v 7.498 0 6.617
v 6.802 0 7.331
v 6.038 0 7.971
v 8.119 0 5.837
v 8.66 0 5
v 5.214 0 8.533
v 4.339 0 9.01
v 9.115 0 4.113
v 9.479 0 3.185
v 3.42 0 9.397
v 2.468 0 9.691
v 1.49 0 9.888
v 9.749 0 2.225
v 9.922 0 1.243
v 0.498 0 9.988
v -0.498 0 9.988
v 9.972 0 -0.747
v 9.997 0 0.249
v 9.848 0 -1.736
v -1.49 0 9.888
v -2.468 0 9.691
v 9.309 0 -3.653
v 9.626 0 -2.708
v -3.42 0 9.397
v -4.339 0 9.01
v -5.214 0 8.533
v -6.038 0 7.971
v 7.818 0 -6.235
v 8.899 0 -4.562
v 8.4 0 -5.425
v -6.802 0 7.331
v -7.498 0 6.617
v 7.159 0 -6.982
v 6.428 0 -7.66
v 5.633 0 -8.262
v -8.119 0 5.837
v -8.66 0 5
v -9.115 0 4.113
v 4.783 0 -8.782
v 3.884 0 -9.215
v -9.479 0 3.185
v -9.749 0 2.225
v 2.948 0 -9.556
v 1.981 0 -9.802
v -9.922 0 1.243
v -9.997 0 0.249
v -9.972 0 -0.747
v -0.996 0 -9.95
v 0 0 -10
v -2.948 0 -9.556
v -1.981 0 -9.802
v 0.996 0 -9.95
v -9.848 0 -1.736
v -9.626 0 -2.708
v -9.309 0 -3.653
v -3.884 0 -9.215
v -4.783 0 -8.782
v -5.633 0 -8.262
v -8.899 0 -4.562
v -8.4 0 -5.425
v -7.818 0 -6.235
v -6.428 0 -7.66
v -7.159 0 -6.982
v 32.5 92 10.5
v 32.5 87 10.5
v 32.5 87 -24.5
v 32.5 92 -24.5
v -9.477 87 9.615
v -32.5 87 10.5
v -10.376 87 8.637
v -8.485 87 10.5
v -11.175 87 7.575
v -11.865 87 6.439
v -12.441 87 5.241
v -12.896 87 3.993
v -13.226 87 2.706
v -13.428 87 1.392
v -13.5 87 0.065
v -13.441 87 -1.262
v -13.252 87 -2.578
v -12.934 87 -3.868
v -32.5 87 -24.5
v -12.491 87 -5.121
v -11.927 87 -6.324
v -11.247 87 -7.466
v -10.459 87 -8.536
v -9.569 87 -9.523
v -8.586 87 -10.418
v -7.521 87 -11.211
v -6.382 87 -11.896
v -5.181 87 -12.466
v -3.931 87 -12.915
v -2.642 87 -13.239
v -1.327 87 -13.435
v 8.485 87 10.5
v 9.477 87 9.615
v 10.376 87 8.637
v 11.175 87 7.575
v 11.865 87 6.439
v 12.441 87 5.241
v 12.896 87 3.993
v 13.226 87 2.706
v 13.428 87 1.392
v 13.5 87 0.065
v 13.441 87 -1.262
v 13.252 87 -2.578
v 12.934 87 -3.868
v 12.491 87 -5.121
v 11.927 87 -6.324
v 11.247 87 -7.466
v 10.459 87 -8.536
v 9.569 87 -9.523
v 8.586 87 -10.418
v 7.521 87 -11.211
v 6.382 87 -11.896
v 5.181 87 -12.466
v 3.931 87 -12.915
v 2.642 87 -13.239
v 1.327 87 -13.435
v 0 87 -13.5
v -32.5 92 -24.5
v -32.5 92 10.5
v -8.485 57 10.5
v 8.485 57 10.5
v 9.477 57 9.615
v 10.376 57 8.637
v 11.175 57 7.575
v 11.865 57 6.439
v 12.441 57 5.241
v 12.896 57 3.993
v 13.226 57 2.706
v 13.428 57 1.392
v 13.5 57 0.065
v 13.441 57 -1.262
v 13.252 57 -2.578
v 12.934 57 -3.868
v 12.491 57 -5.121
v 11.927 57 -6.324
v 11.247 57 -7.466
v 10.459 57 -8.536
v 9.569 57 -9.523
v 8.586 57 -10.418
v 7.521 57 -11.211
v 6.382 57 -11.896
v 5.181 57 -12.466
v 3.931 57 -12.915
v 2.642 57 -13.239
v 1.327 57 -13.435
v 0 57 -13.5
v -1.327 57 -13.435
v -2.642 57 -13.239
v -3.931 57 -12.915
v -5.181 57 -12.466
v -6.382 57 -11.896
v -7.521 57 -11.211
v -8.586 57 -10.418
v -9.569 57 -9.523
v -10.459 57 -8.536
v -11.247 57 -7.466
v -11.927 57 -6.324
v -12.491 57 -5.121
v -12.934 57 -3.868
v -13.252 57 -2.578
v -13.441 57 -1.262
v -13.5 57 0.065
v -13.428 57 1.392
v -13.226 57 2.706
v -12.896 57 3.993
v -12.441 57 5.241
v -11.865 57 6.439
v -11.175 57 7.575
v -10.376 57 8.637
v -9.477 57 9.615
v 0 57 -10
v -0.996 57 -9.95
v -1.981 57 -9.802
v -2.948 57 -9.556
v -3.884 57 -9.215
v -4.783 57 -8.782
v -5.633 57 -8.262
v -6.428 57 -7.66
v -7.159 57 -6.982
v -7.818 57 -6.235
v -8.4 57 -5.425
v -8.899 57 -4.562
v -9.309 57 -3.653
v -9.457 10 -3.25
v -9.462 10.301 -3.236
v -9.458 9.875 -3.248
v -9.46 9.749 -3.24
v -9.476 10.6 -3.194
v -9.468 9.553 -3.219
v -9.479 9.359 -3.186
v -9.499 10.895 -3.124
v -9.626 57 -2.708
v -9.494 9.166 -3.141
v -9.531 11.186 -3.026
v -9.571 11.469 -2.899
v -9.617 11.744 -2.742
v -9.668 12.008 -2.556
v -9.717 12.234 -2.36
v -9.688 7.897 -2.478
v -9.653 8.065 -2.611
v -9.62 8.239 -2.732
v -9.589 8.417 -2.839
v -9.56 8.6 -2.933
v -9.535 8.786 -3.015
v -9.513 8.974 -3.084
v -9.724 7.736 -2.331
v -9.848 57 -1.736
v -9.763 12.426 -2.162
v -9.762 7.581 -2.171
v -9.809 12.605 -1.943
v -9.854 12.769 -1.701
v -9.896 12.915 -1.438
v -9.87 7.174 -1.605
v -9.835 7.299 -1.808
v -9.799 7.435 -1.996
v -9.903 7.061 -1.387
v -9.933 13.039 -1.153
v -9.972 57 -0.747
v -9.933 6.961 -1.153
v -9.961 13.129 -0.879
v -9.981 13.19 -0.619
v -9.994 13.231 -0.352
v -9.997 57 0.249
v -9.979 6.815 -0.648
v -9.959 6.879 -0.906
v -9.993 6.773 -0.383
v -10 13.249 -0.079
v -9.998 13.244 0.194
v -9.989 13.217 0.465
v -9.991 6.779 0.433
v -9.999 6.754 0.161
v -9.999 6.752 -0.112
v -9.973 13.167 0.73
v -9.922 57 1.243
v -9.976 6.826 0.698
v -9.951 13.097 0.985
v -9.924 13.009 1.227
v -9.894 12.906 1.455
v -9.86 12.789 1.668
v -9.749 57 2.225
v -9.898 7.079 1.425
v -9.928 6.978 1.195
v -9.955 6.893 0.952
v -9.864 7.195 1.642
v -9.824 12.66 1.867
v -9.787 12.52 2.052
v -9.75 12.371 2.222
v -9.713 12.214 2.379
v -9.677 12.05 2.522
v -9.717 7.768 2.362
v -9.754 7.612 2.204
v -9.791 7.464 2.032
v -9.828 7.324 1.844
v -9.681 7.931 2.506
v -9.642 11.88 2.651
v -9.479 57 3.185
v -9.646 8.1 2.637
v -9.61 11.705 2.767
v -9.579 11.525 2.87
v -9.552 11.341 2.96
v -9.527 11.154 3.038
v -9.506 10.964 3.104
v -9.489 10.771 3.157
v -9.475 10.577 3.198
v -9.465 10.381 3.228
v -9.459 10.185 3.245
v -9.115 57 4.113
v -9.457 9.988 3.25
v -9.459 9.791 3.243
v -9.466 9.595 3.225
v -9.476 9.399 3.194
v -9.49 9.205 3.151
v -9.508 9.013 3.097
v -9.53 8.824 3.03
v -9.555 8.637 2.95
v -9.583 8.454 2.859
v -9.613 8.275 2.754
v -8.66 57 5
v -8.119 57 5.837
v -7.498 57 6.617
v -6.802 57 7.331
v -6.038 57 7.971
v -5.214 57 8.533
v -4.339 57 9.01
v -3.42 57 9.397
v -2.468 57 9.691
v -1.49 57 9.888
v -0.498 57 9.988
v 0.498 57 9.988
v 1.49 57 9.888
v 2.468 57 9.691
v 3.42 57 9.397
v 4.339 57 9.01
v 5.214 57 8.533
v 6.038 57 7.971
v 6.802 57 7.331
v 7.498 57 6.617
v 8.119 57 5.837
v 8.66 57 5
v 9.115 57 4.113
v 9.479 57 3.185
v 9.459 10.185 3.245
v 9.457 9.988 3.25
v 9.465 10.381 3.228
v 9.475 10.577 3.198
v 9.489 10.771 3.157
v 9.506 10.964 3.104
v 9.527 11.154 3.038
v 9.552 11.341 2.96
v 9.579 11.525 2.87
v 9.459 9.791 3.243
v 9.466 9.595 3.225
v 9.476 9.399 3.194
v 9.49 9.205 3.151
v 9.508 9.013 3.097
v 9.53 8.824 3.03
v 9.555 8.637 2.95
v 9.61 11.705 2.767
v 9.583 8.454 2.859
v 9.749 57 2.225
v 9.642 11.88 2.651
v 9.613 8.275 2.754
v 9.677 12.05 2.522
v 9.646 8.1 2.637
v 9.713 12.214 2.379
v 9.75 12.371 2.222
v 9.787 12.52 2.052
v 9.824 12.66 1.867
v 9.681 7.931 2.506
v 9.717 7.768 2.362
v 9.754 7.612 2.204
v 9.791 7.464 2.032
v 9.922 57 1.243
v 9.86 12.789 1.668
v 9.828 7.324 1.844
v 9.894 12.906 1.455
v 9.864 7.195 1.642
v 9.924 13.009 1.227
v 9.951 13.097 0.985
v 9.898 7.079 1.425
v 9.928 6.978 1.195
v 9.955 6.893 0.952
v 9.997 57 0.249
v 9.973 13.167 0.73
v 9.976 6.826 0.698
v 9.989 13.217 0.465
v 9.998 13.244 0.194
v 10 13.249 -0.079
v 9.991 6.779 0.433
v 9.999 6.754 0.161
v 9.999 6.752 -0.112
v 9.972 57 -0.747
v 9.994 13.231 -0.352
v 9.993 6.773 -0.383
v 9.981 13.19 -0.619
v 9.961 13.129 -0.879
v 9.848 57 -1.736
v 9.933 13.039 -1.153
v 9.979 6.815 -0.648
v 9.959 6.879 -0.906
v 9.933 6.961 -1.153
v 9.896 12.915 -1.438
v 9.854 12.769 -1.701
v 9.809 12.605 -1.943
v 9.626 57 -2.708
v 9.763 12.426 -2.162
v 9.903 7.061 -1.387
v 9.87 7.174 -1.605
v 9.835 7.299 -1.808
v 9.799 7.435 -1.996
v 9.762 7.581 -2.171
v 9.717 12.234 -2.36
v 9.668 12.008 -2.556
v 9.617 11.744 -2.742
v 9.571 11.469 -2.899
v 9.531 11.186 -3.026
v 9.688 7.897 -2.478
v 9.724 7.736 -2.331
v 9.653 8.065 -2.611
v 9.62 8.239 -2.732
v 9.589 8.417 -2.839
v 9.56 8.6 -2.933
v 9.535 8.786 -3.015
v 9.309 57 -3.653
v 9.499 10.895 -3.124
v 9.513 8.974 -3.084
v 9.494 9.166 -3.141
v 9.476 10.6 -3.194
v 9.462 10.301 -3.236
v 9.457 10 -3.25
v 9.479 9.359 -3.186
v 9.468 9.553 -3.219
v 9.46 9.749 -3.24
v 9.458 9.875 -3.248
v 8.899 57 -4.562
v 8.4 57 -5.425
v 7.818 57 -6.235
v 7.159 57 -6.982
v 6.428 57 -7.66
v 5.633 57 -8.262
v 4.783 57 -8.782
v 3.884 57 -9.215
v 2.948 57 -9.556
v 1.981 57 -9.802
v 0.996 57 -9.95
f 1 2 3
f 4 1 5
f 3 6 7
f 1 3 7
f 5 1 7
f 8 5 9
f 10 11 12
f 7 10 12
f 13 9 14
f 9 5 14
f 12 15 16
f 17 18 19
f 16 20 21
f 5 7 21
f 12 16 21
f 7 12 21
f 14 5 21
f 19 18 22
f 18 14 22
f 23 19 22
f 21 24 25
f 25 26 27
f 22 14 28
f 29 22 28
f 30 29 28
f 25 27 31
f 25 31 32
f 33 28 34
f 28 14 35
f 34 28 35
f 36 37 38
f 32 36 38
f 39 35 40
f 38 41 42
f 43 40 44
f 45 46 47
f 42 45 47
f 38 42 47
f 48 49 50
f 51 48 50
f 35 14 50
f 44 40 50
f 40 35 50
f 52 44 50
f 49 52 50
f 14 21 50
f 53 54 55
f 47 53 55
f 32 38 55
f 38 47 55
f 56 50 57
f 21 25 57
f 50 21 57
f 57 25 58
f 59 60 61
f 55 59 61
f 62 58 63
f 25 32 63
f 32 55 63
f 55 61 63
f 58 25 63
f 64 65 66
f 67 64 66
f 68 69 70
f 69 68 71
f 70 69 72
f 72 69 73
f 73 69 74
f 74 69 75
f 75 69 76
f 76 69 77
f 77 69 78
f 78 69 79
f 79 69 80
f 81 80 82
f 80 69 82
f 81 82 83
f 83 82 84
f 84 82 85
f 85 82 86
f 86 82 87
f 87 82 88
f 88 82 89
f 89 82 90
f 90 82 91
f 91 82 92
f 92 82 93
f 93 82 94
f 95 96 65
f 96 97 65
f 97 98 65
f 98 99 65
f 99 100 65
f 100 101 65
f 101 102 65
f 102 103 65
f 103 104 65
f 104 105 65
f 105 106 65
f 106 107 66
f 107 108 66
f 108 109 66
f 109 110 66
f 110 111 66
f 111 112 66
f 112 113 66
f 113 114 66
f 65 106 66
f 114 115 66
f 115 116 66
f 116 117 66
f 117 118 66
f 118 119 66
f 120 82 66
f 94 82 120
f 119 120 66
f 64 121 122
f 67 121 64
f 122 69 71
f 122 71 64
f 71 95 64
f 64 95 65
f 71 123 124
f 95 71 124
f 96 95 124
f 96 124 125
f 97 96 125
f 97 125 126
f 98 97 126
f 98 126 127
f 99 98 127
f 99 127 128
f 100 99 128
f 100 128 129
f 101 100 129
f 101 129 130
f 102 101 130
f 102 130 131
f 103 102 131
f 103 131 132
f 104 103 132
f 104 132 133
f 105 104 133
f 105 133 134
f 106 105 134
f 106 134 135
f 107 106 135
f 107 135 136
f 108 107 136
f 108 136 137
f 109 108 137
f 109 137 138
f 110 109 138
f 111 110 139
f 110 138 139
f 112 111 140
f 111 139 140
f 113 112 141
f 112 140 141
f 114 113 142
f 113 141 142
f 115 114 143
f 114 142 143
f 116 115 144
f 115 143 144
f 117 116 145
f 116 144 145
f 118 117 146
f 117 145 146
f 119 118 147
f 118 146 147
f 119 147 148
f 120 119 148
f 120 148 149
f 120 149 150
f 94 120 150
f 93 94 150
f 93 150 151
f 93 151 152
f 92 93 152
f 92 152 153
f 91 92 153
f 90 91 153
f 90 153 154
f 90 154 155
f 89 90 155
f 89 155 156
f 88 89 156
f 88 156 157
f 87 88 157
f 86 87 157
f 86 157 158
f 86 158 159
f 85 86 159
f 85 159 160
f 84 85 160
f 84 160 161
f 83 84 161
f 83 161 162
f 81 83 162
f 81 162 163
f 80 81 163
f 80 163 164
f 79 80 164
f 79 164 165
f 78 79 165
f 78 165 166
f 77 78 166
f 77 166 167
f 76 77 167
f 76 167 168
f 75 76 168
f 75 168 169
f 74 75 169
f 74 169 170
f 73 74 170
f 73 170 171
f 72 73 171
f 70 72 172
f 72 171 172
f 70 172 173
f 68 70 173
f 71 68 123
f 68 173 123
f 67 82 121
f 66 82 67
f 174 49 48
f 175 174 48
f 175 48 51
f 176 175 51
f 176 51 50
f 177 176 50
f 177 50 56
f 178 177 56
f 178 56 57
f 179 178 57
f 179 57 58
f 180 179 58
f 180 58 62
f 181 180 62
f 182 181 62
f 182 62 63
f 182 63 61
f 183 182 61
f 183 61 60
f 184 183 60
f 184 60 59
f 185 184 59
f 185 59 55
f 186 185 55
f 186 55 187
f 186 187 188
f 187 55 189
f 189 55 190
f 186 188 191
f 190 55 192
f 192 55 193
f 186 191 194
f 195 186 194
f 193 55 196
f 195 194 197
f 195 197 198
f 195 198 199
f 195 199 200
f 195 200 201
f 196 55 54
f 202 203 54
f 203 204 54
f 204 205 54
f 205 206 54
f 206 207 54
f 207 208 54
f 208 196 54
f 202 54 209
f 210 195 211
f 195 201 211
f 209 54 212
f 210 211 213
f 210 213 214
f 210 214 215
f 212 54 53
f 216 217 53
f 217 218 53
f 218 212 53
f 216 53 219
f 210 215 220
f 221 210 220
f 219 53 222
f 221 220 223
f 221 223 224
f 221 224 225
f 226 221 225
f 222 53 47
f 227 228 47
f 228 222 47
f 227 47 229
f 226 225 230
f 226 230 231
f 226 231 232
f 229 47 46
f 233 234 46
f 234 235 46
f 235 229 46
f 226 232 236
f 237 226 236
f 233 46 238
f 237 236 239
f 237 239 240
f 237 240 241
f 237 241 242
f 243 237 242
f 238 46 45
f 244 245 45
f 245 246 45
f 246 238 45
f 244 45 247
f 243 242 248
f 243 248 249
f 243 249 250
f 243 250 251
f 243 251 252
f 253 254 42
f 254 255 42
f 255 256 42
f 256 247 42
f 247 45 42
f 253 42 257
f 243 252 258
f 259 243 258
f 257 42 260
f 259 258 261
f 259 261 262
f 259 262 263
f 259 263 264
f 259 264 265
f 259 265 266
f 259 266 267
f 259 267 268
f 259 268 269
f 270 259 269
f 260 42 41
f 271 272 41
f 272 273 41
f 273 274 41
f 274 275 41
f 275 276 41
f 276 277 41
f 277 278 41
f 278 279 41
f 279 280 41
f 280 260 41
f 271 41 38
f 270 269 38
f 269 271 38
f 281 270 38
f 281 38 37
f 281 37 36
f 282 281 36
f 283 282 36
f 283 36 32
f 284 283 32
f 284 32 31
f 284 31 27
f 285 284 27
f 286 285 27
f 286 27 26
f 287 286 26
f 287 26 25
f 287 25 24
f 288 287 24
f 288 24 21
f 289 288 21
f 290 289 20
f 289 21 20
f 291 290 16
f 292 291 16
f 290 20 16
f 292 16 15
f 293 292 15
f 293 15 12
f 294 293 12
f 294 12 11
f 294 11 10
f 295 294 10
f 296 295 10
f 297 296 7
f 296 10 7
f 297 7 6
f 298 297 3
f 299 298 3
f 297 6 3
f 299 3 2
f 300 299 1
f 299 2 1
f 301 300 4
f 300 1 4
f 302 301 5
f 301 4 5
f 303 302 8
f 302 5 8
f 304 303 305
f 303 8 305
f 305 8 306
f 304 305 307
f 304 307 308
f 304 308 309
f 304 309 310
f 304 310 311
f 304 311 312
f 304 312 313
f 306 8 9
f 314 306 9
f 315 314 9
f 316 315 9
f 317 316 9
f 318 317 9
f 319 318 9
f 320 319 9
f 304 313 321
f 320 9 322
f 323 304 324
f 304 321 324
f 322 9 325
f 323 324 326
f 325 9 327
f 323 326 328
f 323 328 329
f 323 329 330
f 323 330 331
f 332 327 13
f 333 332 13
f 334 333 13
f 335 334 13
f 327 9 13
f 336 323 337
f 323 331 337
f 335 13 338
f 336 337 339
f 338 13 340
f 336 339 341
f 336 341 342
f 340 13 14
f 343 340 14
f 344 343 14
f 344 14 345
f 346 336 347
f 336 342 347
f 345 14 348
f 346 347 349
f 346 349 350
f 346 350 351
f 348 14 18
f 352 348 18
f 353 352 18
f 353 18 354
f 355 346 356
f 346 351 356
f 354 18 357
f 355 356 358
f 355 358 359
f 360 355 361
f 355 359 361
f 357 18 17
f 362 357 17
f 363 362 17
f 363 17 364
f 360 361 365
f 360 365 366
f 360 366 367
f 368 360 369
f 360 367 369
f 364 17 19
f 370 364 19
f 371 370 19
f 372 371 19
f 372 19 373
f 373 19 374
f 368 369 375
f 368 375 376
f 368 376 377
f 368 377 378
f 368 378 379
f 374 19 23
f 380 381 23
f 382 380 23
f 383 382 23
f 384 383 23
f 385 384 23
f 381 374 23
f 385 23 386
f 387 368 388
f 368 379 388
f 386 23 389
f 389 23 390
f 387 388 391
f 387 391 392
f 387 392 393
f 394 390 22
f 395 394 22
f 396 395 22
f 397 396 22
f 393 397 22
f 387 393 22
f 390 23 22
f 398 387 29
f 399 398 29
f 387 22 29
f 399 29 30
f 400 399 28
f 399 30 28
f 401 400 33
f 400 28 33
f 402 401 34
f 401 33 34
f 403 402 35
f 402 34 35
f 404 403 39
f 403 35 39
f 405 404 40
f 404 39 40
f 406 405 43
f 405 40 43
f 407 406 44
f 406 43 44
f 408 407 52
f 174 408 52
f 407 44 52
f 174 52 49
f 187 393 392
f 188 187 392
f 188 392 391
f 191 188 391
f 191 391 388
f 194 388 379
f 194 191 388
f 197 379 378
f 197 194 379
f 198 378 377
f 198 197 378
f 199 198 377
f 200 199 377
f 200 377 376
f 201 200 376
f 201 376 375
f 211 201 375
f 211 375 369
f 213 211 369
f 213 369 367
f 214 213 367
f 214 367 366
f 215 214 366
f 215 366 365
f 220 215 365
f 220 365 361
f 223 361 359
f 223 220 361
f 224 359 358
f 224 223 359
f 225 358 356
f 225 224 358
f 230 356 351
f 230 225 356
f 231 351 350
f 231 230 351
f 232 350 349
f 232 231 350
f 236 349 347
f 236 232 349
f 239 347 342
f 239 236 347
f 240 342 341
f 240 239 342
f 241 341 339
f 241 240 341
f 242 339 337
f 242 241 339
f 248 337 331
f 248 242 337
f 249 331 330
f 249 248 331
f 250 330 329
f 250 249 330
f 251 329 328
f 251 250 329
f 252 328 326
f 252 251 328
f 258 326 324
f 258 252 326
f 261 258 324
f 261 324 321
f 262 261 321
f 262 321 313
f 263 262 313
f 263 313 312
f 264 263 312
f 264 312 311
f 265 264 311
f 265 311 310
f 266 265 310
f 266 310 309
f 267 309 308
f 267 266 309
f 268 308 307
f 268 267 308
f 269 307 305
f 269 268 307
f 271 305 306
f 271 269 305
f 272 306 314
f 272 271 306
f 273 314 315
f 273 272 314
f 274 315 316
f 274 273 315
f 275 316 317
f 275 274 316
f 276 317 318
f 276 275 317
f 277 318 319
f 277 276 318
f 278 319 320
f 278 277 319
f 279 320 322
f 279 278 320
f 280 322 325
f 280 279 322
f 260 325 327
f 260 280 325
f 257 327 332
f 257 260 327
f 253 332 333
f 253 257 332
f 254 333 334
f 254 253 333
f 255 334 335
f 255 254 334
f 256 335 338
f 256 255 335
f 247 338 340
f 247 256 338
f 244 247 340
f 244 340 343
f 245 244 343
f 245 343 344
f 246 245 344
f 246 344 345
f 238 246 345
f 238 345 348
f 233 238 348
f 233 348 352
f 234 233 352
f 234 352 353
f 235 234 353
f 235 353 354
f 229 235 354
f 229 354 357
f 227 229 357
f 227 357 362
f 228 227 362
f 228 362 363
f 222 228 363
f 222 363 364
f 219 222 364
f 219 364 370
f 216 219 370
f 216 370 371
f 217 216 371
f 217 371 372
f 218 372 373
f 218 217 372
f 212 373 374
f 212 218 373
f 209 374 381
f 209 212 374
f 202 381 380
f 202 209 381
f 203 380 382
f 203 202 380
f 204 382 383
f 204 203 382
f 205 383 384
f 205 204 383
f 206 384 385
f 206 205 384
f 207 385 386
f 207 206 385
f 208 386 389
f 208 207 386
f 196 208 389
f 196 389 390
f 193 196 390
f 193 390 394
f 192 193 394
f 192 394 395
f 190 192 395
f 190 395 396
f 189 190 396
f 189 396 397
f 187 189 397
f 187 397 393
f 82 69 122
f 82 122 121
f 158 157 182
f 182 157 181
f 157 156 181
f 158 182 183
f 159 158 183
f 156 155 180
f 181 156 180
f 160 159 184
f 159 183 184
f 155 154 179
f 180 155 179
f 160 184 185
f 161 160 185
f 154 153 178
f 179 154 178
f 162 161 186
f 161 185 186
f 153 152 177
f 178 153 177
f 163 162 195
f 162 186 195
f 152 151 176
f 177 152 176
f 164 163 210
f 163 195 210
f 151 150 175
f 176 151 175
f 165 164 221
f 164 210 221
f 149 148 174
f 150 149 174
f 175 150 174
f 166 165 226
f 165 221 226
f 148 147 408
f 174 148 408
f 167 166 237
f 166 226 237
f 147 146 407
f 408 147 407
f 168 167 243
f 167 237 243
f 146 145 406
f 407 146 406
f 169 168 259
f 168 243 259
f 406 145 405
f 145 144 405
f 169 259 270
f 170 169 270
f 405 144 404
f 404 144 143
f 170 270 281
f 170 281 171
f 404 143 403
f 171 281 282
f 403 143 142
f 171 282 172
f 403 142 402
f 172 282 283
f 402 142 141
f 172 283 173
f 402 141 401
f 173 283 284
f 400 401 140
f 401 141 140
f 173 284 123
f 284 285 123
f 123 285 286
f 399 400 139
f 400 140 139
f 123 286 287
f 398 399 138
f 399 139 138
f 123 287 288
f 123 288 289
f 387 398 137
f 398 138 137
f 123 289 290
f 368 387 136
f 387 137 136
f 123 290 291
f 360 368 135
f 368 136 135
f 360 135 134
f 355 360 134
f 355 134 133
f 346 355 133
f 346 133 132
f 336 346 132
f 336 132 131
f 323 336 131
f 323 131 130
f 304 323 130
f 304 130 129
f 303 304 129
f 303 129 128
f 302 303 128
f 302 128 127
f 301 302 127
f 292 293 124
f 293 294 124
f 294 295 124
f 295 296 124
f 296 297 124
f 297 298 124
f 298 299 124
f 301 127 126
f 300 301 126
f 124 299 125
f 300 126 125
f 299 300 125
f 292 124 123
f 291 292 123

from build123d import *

# Parameters (mm, degrees)
SKETCH_1_R               = 10
EXTRUDE_1_DEPTH          = 57
SKETCH_2_R               = 13.5
EXTRUDE_2_DEPTH          = 30
CUT_EXTRUDE_1_DEPTH      = 90.070197036
CUT_EXTRUDE_1_DEPTH_BACK = 90.070197036
SKETCH_7_R               = 3.25
SKETCH_8_W               = 27
SKETCH_8_H               = 6
CUT_EXTRUDE_2_DEPTH      = 90.070197133
SKETCH_9_W               = 65
SKETCH_9_H               = 35
EXTRUDE_3_DEPTH          = 5


with BuildPart() as part:
    # 스케치1 → 보스-돌출1 (new body)
    with BuildSketch(Plane(origin=(0, 0, 0), x_dir=(1, 0, 0), z_dir=(0, 1, 0))):
        with Locations(Location((0, 0, 0), (0, 0, 90))):
            Circle(SKETCH_1_R)
    extrude(amount=EXTRUDE_1_DEPTH)

    # 스케치2 → 보스-돌출2 (add)
    with BuildSketch(Plane(origin=(0, 57, 0), x_dir=(1, 0, 0), z_dir=(0, 1, 0))):
        with Locations(Location((0, 0, 0), (0, 0, 270))):
            Circle(SKETCH_2_R)
    extrude(amount=EXTRUDE_2_DEPTH)

    # 스케치7 → 컷-돌출1 (cut, two sides: drawn at the far end of the back side and taken through both)
    with BuildSketch(Plane(origin=(0, 0, 0), x_dir=(0, 0, -1), z_dir=(1, 0, 0)).offset(-CUT_EXTRUDE_1_DEPTH_BACK)):
        with Locations((0, 10)):
            Circle(SKETCH_7_R)
    extrude(amount=CUT_EXTRUDE_1_DEPTH + CUT_EXTRUDE_1_DEPTH_BACK, mode=Mode.SUBTRACT)

    # 스케치8 → 컷-돌출2 (cut, through all)
    with BuildSketch(Plane(origin=(0, 87, 0), x_dir=(1, 0, 0), z_dir=(0, 1, 0))):
        with Locations((0, -13.5)):
            Rectangle(SKETCH_8_W, SKETCH_8_H)
    extrude(amount=-CUT_EXTRUDE_2_DEPTH, mode=Mode.SUBTRACT)

    # 스케치9 → 보스-돌출3 (add)
    with BuildSketch(Plane(origin=(0, 87, 0), x_dir=(1, 0, 0), z_dir=(0, 1, 0))):
        with Locations((0, 7)):
            Rectangle(SKETCH_9_W, SKETCH_9_H)
    extrude(amount=EXTRUDE_3_DEPTH)


solid = part.part
